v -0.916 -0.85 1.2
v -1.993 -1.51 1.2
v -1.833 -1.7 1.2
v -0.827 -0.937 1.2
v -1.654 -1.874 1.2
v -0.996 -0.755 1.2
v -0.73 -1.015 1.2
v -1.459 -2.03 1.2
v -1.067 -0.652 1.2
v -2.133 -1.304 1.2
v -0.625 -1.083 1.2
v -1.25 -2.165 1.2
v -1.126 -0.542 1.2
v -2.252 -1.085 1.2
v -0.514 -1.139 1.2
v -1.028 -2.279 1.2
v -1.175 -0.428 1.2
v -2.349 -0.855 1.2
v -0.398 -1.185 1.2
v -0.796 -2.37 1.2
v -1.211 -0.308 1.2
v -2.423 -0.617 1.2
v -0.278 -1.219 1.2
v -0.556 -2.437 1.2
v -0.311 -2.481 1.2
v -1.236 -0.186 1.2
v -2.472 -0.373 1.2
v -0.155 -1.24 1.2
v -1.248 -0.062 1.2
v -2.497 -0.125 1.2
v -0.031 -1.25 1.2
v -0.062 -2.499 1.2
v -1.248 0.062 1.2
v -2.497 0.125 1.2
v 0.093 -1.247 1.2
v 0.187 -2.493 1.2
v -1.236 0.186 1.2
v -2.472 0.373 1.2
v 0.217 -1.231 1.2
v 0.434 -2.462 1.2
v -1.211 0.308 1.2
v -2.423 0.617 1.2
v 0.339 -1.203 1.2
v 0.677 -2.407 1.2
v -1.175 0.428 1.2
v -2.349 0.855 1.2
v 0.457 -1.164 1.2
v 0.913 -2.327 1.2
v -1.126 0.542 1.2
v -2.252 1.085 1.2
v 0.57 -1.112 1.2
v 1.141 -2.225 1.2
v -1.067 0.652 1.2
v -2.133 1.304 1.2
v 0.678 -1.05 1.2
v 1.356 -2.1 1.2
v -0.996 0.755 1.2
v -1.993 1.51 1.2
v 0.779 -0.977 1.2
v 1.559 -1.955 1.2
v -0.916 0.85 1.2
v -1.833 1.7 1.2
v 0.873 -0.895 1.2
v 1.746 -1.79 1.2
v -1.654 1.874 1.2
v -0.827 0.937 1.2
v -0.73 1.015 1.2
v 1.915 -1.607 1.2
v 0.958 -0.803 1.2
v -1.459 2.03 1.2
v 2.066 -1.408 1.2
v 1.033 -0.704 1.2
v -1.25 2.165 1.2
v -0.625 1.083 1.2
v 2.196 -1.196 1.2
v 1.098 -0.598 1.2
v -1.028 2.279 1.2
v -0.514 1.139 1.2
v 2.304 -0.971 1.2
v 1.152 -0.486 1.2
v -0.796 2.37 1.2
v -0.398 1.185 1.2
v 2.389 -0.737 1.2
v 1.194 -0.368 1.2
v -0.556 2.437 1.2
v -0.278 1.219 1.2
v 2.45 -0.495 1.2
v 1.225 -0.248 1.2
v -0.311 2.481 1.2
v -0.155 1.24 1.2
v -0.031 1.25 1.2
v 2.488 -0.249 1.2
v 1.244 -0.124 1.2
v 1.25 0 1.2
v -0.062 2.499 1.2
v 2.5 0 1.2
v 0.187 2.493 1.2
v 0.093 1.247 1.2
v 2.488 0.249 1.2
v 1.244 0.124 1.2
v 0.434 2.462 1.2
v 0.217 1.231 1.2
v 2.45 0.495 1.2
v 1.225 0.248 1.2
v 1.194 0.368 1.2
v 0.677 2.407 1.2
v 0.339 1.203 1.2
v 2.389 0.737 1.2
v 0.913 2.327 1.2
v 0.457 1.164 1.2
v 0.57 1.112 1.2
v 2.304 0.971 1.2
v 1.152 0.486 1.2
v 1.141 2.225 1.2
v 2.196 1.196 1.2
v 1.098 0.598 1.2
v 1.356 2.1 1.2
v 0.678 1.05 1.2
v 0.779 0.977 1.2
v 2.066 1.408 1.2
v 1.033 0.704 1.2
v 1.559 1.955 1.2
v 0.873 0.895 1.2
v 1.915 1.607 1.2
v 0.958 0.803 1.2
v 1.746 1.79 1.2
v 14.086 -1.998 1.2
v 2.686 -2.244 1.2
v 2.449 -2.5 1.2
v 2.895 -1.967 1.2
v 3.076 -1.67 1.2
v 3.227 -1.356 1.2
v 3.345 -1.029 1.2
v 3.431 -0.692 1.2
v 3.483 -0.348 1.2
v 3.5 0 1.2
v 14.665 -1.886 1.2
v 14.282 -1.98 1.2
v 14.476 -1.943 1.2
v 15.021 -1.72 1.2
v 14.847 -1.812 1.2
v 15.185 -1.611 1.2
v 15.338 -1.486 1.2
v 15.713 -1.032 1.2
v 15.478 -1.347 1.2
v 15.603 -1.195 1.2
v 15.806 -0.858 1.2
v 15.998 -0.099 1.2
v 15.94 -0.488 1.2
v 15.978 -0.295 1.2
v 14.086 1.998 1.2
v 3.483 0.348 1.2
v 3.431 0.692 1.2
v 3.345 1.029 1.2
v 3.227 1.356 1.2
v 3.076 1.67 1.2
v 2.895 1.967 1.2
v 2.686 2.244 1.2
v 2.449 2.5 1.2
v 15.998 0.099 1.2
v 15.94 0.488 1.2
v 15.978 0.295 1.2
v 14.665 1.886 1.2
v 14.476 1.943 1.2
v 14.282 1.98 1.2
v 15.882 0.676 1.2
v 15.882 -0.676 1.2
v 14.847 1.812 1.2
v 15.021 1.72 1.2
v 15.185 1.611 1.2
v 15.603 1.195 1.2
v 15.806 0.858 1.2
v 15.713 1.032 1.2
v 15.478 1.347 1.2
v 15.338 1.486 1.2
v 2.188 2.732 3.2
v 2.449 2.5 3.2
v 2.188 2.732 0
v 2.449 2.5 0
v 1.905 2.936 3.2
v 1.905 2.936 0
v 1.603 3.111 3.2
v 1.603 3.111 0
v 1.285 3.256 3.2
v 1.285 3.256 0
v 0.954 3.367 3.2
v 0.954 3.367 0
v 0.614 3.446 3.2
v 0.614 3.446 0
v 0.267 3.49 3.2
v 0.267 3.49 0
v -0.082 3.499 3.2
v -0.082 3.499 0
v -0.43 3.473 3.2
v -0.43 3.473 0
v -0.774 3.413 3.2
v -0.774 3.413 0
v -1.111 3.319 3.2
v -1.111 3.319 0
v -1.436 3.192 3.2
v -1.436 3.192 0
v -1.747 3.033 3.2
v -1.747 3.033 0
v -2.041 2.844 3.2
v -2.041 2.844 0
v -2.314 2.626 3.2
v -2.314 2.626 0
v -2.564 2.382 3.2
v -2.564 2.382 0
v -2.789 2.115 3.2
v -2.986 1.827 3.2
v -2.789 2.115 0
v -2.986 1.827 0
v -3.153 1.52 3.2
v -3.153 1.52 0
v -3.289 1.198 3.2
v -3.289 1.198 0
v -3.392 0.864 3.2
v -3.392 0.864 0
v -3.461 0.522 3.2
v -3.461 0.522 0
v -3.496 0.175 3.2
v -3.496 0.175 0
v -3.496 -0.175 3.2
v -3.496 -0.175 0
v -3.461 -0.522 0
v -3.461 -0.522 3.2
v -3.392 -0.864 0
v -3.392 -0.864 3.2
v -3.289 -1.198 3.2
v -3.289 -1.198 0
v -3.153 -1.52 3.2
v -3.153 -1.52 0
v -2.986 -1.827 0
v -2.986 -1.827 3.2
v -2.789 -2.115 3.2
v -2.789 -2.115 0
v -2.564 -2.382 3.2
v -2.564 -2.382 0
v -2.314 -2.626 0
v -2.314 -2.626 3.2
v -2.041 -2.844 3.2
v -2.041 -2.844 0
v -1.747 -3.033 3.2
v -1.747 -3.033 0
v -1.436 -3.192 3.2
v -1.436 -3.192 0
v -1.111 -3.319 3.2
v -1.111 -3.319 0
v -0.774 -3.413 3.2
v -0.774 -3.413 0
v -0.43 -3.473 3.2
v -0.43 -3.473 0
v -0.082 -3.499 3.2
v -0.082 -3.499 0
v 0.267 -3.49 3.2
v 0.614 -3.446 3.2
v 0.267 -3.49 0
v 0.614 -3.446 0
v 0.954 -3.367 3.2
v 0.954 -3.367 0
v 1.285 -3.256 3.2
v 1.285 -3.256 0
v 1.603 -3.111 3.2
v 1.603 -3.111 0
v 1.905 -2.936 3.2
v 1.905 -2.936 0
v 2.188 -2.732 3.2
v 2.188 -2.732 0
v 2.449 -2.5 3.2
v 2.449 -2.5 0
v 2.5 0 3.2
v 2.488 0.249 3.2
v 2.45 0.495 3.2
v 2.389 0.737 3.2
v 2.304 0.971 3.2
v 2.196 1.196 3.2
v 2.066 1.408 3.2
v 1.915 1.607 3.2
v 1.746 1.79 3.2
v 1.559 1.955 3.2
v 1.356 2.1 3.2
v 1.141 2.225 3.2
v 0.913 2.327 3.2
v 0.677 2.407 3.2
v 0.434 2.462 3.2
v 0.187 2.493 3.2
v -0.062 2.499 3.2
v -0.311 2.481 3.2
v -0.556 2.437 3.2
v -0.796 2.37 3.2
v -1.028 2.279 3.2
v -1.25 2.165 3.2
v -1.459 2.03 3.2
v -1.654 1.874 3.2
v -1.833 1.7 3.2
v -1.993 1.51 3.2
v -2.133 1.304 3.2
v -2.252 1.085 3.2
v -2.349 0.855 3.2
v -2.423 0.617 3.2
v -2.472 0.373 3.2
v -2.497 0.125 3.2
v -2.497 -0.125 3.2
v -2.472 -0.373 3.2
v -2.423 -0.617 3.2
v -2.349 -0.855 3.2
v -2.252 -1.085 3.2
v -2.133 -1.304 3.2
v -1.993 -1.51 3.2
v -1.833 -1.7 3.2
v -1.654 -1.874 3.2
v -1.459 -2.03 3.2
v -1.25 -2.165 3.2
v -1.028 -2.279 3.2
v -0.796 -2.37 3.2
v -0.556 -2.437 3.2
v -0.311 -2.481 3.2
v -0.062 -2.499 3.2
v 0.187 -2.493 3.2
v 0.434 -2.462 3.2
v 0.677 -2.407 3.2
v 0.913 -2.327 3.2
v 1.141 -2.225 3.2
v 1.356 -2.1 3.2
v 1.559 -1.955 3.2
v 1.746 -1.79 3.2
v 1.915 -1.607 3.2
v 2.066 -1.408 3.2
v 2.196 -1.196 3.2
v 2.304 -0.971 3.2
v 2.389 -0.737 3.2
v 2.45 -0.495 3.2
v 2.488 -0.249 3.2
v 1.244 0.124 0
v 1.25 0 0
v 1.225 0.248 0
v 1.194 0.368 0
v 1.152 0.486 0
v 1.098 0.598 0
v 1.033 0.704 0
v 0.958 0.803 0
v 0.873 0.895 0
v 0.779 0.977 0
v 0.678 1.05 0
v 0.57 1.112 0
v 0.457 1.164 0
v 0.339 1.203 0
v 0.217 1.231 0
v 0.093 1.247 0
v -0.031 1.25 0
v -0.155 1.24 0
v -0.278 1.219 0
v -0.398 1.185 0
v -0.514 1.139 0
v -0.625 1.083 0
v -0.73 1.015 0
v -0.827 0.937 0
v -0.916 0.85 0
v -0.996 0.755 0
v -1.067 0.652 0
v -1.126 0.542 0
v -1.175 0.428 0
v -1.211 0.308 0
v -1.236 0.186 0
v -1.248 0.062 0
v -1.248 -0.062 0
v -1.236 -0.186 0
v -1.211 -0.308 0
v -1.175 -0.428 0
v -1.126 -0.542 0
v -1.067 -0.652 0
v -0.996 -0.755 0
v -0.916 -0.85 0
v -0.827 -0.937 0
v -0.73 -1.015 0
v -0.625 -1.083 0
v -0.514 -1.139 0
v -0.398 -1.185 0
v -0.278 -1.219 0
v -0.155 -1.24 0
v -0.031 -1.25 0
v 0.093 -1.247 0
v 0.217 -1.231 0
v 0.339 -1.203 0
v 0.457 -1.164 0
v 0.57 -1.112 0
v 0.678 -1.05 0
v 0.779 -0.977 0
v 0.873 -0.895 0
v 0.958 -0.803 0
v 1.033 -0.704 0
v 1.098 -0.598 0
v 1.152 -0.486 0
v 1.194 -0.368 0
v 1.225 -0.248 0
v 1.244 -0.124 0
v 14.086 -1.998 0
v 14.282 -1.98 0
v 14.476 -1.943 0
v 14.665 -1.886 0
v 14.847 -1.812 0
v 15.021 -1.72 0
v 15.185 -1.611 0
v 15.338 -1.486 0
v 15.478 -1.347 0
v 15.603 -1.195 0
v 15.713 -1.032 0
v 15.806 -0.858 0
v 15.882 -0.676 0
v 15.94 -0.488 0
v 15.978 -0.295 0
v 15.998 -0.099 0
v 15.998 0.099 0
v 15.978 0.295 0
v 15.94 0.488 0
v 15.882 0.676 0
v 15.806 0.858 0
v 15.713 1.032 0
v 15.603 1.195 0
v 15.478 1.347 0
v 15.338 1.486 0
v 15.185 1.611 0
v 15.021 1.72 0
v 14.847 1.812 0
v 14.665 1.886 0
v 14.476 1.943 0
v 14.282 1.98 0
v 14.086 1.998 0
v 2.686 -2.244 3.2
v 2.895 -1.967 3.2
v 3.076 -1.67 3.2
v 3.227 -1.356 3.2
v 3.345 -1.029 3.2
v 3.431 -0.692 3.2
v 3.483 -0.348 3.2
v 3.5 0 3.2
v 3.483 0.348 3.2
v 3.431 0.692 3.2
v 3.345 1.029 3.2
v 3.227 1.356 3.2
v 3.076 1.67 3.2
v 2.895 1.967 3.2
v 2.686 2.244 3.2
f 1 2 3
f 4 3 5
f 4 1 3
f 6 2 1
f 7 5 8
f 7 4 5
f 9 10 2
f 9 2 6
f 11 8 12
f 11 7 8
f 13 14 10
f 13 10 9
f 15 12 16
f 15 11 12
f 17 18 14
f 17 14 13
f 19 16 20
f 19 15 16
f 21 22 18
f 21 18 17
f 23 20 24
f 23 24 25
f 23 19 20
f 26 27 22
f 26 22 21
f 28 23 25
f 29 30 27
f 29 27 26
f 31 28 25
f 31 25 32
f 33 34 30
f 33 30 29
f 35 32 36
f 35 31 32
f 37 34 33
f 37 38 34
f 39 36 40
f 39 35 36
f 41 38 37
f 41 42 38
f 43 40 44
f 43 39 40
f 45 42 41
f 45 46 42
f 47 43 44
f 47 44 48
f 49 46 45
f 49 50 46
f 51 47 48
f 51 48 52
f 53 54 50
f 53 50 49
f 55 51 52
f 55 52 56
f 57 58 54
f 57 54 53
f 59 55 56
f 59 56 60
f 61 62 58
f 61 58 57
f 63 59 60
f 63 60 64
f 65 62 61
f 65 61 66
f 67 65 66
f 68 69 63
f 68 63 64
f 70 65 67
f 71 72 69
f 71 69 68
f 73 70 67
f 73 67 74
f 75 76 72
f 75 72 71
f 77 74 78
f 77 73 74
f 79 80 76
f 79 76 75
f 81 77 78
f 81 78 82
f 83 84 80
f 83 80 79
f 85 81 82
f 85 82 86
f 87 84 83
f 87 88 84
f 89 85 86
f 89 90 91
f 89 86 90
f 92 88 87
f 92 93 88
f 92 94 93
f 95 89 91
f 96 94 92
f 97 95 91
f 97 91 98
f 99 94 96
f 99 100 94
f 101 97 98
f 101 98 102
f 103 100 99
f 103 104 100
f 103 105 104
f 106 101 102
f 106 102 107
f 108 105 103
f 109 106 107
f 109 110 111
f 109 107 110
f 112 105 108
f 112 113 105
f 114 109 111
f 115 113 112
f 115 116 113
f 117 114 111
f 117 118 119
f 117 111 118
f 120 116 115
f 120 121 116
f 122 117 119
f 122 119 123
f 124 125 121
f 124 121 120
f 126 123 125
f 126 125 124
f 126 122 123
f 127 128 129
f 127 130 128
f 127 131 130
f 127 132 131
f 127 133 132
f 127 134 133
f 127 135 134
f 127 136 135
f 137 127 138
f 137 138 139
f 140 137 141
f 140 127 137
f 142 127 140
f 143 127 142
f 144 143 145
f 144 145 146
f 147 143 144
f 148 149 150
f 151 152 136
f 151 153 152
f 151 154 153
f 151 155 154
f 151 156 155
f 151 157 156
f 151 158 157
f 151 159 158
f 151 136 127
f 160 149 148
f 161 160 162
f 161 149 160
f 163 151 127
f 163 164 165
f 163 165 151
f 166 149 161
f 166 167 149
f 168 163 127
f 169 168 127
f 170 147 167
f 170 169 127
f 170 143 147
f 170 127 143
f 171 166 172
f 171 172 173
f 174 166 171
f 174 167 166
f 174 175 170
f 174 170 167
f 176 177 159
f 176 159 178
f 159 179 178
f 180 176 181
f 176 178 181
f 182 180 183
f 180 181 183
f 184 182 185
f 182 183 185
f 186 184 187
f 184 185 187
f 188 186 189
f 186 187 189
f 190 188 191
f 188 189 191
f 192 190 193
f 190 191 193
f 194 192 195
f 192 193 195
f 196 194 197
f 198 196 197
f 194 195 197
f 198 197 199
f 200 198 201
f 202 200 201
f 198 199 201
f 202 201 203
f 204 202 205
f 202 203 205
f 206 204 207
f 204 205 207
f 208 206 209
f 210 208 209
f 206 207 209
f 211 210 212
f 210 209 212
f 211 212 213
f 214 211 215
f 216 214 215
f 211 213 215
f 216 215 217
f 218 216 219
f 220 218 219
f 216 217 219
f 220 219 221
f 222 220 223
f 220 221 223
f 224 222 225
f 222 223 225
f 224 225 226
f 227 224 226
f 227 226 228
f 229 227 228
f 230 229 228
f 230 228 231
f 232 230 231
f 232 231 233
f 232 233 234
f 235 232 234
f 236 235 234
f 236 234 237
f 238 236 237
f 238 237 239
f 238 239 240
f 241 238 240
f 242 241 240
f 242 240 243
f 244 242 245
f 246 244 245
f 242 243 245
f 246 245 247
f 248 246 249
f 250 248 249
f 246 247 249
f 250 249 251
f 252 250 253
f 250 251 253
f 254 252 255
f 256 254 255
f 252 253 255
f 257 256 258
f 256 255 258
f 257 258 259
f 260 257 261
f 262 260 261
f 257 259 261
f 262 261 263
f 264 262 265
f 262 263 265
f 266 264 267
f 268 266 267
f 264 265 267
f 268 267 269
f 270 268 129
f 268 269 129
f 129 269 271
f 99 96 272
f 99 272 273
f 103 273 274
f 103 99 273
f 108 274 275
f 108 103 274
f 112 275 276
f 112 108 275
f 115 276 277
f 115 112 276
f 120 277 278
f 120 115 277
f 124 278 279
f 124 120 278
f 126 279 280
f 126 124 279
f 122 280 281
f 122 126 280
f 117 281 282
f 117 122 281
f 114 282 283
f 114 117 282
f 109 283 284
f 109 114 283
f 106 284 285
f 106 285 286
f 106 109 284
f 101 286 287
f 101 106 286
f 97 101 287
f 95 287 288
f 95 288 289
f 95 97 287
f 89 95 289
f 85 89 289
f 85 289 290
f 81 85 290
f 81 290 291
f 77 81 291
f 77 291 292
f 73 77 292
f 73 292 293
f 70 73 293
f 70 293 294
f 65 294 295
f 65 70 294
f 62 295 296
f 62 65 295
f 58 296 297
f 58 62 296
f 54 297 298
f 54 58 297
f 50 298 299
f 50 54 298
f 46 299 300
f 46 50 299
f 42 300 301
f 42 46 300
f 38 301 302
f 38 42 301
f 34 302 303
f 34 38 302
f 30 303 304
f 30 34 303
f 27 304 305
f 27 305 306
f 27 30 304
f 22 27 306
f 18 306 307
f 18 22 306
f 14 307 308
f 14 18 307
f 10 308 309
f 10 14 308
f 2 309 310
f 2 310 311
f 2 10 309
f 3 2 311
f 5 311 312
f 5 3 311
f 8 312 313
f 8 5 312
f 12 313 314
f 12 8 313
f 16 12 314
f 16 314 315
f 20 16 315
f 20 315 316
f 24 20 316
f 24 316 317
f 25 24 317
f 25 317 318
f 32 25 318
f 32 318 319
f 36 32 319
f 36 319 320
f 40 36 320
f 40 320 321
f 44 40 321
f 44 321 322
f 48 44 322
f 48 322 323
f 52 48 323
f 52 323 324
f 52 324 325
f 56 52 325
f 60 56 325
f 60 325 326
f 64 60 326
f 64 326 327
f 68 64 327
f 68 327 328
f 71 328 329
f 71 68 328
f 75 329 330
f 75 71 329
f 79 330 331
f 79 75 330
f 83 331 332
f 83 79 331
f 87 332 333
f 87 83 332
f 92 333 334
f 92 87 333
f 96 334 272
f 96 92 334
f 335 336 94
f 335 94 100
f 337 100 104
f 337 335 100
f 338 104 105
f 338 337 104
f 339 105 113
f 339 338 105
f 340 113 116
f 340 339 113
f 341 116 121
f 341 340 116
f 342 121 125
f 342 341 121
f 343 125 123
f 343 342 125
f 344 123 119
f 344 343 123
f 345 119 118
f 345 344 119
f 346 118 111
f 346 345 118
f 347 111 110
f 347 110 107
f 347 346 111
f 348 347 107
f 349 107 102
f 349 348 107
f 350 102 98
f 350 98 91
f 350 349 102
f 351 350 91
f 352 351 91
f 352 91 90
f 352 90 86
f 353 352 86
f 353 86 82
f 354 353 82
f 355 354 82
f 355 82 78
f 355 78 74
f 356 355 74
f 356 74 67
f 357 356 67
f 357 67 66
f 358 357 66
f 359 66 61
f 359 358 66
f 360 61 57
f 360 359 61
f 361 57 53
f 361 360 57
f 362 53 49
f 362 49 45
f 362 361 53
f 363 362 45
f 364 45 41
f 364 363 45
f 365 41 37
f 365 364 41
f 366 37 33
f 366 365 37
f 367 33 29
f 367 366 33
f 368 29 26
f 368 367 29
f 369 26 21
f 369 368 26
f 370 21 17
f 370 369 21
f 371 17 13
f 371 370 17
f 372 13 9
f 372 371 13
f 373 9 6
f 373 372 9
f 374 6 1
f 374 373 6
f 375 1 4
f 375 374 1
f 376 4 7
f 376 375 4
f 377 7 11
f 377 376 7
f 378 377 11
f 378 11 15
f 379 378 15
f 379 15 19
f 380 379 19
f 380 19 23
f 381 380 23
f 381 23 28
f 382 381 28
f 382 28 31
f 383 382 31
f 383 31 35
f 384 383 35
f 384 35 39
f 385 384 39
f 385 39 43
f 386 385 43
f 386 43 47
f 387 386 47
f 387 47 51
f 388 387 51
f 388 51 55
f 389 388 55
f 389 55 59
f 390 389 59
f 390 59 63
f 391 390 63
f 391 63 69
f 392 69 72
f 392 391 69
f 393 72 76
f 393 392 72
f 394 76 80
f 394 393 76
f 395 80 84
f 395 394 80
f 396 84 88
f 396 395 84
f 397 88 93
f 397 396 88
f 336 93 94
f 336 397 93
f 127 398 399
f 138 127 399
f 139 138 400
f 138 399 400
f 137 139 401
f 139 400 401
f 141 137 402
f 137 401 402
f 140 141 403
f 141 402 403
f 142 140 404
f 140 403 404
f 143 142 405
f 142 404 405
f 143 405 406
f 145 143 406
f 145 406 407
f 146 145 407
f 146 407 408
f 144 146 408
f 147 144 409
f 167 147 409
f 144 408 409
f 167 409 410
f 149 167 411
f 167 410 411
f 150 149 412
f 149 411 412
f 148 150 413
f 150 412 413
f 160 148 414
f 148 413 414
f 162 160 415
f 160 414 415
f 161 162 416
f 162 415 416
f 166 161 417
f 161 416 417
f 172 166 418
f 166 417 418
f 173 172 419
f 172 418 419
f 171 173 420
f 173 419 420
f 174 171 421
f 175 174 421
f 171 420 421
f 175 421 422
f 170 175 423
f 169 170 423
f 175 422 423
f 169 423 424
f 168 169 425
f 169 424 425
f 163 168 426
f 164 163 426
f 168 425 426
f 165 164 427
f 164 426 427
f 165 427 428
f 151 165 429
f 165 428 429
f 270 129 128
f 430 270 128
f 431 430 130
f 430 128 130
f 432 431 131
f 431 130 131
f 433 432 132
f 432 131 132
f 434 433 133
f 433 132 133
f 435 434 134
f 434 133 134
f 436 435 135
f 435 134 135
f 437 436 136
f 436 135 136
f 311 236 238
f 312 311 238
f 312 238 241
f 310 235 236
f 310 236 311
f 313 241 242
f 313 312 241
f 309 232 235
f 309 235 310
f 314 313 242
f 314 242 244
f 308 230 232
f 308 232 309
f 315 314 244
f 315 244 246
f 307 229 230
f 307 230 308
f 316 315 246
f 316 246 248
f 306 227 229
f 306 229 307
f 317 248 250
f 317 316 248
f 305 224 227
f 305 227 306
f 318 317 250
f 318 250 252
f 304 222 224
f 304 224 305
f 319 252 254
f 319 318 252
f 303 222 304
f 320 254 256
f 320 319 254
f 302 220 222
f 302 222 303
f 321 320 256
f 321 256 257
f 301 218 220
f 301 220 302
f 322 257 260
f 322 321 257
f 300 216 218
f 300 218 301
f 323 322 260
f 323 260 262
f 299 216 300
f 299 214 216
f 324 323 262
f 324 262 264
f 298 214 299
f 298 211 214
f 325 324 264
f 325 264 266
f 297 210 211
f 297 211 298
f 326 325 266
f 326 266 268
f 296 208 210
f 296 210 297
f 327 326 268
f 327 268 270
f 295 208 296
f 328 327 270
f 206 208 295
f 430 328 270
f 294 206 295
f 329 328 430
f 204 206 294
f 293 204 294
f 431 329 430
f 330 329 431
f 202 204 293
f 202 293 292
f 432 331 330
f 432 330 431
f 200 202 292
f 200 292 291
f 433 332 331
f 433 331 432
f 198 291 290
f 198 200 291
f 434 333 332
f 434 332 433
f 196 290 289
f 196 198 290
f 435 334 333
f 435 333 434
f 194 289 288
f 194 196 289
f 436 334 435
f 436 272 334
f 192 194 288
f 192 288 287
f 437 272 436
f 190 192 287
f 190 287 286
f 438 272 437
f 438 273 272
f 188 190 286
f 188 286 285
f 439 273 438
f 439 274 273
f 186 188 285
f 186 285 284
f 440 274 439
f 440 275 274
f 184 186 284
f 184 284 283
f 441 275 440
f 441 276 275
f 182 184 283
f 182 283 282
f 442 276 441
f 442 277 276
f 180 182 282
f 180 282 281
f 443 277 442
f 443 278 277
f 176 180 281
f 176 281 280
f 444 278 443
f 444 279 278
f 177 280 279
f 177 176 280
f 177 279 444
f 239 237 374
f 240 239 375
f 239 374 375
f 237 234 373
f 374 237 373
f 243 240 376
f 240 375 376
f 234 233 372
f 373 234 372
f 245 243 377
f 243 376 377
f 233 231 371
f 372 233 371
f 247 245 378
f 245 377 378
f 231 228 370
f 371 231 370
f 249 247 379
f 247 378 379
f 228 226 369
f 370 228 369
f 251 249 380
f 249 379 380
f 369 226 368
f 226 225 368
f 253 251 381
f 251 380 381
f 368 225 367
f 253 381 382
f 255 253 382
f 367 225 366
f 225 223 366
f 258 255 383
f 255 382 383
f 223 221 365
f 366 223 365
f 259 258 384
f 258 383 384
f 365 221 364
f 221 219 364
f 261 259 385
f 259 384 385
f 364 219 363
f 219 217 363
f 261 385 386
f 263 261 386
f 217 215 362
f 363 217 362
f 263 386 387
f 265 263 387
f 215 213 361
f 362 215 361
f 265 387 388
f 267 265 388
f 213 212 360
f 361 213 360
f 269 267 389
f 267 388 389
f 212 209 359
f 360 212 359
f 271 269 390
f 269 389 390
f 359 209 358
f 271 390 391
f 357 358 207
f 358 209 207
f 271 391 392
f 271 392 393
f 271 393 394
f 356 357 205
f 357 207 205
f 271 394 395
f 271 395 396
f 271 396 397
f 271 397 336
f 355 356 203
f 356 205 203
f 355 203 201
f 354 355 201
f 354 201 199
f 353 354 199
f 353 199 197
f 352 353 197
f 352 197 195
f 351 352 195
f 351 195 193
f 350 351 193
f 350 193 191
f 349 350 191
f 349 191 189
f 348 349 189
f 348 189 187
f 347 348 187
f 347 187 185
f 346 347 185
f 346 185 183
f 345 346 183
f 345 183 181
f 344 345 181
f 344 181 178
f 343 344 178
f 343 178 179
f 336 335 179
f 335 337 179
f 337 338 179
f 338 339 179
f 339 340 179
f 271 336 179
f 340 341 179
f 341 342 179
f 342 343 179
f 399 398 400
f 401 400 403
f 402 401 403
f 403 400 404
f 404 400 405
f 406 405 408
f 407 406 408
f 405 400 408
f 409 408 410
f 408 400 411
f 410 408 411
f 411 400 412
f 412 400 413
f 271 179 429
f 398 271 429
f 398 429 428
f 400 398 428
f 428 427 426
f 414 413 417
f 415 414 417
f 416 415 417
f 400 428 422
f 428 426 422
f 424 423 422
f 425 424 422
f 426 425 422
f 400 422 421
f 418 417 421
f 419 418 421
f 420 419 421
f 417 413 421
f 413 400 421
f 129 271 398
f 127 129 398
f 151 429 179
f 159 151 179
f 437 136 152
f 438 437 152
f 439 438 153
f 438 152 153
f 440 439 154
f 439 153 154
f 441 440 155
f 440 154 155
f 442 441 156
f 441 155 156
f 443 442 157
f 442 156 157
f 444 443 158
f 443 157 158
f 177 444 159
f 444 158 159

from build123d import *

# Parameters (mm, degrees)
F0_R     = 1.25
F1_DEPTH = 1.2
F2_R     = 2.5
F3_DEPTH = 2


with BuildPart() as f1:
    # F0 (on Top) → F1 (new body)
    with BuildSketch(Plane.XY):
        with BuildLine():
            Line((14.086174, 1.998143), (2.44949, 2.5))
            ThreePointArc((2.44949, 2.5), (-3.5, 0), (2.44949, -2.5))
            Line((2.44949, -2.5), (14.086174, -1.998143))
            ThreePointArc((14.086174, -1.998143), (16, 0), (14.086174, 1.998143))
        make_face()
        Circle(F0_R, mode=Mode.SUBTRACT)
    extrude(amount=F1_DEPTH)

    # F2 (on face) → F3 (join)
    with BuildSketch(Plane.XY.offset(1.2)):
        with BuildLine():
            ThreePointArc((2.44949, -2.5), (3.226702, -1.355874), (3.5, 0))
            ThreePointArc((3.5, 0), (3.226702, 1.355874), (2.44949, 2.5))
            ThreePointArc((2.44949, 2.5), (-3.5, 0), (2.44949, -2.5))
        make_face()
        Circle(F2_R, mode=Mode.SUBTRACT)
    extrude(amount=F3_DEPTH)


solid = f1.part
